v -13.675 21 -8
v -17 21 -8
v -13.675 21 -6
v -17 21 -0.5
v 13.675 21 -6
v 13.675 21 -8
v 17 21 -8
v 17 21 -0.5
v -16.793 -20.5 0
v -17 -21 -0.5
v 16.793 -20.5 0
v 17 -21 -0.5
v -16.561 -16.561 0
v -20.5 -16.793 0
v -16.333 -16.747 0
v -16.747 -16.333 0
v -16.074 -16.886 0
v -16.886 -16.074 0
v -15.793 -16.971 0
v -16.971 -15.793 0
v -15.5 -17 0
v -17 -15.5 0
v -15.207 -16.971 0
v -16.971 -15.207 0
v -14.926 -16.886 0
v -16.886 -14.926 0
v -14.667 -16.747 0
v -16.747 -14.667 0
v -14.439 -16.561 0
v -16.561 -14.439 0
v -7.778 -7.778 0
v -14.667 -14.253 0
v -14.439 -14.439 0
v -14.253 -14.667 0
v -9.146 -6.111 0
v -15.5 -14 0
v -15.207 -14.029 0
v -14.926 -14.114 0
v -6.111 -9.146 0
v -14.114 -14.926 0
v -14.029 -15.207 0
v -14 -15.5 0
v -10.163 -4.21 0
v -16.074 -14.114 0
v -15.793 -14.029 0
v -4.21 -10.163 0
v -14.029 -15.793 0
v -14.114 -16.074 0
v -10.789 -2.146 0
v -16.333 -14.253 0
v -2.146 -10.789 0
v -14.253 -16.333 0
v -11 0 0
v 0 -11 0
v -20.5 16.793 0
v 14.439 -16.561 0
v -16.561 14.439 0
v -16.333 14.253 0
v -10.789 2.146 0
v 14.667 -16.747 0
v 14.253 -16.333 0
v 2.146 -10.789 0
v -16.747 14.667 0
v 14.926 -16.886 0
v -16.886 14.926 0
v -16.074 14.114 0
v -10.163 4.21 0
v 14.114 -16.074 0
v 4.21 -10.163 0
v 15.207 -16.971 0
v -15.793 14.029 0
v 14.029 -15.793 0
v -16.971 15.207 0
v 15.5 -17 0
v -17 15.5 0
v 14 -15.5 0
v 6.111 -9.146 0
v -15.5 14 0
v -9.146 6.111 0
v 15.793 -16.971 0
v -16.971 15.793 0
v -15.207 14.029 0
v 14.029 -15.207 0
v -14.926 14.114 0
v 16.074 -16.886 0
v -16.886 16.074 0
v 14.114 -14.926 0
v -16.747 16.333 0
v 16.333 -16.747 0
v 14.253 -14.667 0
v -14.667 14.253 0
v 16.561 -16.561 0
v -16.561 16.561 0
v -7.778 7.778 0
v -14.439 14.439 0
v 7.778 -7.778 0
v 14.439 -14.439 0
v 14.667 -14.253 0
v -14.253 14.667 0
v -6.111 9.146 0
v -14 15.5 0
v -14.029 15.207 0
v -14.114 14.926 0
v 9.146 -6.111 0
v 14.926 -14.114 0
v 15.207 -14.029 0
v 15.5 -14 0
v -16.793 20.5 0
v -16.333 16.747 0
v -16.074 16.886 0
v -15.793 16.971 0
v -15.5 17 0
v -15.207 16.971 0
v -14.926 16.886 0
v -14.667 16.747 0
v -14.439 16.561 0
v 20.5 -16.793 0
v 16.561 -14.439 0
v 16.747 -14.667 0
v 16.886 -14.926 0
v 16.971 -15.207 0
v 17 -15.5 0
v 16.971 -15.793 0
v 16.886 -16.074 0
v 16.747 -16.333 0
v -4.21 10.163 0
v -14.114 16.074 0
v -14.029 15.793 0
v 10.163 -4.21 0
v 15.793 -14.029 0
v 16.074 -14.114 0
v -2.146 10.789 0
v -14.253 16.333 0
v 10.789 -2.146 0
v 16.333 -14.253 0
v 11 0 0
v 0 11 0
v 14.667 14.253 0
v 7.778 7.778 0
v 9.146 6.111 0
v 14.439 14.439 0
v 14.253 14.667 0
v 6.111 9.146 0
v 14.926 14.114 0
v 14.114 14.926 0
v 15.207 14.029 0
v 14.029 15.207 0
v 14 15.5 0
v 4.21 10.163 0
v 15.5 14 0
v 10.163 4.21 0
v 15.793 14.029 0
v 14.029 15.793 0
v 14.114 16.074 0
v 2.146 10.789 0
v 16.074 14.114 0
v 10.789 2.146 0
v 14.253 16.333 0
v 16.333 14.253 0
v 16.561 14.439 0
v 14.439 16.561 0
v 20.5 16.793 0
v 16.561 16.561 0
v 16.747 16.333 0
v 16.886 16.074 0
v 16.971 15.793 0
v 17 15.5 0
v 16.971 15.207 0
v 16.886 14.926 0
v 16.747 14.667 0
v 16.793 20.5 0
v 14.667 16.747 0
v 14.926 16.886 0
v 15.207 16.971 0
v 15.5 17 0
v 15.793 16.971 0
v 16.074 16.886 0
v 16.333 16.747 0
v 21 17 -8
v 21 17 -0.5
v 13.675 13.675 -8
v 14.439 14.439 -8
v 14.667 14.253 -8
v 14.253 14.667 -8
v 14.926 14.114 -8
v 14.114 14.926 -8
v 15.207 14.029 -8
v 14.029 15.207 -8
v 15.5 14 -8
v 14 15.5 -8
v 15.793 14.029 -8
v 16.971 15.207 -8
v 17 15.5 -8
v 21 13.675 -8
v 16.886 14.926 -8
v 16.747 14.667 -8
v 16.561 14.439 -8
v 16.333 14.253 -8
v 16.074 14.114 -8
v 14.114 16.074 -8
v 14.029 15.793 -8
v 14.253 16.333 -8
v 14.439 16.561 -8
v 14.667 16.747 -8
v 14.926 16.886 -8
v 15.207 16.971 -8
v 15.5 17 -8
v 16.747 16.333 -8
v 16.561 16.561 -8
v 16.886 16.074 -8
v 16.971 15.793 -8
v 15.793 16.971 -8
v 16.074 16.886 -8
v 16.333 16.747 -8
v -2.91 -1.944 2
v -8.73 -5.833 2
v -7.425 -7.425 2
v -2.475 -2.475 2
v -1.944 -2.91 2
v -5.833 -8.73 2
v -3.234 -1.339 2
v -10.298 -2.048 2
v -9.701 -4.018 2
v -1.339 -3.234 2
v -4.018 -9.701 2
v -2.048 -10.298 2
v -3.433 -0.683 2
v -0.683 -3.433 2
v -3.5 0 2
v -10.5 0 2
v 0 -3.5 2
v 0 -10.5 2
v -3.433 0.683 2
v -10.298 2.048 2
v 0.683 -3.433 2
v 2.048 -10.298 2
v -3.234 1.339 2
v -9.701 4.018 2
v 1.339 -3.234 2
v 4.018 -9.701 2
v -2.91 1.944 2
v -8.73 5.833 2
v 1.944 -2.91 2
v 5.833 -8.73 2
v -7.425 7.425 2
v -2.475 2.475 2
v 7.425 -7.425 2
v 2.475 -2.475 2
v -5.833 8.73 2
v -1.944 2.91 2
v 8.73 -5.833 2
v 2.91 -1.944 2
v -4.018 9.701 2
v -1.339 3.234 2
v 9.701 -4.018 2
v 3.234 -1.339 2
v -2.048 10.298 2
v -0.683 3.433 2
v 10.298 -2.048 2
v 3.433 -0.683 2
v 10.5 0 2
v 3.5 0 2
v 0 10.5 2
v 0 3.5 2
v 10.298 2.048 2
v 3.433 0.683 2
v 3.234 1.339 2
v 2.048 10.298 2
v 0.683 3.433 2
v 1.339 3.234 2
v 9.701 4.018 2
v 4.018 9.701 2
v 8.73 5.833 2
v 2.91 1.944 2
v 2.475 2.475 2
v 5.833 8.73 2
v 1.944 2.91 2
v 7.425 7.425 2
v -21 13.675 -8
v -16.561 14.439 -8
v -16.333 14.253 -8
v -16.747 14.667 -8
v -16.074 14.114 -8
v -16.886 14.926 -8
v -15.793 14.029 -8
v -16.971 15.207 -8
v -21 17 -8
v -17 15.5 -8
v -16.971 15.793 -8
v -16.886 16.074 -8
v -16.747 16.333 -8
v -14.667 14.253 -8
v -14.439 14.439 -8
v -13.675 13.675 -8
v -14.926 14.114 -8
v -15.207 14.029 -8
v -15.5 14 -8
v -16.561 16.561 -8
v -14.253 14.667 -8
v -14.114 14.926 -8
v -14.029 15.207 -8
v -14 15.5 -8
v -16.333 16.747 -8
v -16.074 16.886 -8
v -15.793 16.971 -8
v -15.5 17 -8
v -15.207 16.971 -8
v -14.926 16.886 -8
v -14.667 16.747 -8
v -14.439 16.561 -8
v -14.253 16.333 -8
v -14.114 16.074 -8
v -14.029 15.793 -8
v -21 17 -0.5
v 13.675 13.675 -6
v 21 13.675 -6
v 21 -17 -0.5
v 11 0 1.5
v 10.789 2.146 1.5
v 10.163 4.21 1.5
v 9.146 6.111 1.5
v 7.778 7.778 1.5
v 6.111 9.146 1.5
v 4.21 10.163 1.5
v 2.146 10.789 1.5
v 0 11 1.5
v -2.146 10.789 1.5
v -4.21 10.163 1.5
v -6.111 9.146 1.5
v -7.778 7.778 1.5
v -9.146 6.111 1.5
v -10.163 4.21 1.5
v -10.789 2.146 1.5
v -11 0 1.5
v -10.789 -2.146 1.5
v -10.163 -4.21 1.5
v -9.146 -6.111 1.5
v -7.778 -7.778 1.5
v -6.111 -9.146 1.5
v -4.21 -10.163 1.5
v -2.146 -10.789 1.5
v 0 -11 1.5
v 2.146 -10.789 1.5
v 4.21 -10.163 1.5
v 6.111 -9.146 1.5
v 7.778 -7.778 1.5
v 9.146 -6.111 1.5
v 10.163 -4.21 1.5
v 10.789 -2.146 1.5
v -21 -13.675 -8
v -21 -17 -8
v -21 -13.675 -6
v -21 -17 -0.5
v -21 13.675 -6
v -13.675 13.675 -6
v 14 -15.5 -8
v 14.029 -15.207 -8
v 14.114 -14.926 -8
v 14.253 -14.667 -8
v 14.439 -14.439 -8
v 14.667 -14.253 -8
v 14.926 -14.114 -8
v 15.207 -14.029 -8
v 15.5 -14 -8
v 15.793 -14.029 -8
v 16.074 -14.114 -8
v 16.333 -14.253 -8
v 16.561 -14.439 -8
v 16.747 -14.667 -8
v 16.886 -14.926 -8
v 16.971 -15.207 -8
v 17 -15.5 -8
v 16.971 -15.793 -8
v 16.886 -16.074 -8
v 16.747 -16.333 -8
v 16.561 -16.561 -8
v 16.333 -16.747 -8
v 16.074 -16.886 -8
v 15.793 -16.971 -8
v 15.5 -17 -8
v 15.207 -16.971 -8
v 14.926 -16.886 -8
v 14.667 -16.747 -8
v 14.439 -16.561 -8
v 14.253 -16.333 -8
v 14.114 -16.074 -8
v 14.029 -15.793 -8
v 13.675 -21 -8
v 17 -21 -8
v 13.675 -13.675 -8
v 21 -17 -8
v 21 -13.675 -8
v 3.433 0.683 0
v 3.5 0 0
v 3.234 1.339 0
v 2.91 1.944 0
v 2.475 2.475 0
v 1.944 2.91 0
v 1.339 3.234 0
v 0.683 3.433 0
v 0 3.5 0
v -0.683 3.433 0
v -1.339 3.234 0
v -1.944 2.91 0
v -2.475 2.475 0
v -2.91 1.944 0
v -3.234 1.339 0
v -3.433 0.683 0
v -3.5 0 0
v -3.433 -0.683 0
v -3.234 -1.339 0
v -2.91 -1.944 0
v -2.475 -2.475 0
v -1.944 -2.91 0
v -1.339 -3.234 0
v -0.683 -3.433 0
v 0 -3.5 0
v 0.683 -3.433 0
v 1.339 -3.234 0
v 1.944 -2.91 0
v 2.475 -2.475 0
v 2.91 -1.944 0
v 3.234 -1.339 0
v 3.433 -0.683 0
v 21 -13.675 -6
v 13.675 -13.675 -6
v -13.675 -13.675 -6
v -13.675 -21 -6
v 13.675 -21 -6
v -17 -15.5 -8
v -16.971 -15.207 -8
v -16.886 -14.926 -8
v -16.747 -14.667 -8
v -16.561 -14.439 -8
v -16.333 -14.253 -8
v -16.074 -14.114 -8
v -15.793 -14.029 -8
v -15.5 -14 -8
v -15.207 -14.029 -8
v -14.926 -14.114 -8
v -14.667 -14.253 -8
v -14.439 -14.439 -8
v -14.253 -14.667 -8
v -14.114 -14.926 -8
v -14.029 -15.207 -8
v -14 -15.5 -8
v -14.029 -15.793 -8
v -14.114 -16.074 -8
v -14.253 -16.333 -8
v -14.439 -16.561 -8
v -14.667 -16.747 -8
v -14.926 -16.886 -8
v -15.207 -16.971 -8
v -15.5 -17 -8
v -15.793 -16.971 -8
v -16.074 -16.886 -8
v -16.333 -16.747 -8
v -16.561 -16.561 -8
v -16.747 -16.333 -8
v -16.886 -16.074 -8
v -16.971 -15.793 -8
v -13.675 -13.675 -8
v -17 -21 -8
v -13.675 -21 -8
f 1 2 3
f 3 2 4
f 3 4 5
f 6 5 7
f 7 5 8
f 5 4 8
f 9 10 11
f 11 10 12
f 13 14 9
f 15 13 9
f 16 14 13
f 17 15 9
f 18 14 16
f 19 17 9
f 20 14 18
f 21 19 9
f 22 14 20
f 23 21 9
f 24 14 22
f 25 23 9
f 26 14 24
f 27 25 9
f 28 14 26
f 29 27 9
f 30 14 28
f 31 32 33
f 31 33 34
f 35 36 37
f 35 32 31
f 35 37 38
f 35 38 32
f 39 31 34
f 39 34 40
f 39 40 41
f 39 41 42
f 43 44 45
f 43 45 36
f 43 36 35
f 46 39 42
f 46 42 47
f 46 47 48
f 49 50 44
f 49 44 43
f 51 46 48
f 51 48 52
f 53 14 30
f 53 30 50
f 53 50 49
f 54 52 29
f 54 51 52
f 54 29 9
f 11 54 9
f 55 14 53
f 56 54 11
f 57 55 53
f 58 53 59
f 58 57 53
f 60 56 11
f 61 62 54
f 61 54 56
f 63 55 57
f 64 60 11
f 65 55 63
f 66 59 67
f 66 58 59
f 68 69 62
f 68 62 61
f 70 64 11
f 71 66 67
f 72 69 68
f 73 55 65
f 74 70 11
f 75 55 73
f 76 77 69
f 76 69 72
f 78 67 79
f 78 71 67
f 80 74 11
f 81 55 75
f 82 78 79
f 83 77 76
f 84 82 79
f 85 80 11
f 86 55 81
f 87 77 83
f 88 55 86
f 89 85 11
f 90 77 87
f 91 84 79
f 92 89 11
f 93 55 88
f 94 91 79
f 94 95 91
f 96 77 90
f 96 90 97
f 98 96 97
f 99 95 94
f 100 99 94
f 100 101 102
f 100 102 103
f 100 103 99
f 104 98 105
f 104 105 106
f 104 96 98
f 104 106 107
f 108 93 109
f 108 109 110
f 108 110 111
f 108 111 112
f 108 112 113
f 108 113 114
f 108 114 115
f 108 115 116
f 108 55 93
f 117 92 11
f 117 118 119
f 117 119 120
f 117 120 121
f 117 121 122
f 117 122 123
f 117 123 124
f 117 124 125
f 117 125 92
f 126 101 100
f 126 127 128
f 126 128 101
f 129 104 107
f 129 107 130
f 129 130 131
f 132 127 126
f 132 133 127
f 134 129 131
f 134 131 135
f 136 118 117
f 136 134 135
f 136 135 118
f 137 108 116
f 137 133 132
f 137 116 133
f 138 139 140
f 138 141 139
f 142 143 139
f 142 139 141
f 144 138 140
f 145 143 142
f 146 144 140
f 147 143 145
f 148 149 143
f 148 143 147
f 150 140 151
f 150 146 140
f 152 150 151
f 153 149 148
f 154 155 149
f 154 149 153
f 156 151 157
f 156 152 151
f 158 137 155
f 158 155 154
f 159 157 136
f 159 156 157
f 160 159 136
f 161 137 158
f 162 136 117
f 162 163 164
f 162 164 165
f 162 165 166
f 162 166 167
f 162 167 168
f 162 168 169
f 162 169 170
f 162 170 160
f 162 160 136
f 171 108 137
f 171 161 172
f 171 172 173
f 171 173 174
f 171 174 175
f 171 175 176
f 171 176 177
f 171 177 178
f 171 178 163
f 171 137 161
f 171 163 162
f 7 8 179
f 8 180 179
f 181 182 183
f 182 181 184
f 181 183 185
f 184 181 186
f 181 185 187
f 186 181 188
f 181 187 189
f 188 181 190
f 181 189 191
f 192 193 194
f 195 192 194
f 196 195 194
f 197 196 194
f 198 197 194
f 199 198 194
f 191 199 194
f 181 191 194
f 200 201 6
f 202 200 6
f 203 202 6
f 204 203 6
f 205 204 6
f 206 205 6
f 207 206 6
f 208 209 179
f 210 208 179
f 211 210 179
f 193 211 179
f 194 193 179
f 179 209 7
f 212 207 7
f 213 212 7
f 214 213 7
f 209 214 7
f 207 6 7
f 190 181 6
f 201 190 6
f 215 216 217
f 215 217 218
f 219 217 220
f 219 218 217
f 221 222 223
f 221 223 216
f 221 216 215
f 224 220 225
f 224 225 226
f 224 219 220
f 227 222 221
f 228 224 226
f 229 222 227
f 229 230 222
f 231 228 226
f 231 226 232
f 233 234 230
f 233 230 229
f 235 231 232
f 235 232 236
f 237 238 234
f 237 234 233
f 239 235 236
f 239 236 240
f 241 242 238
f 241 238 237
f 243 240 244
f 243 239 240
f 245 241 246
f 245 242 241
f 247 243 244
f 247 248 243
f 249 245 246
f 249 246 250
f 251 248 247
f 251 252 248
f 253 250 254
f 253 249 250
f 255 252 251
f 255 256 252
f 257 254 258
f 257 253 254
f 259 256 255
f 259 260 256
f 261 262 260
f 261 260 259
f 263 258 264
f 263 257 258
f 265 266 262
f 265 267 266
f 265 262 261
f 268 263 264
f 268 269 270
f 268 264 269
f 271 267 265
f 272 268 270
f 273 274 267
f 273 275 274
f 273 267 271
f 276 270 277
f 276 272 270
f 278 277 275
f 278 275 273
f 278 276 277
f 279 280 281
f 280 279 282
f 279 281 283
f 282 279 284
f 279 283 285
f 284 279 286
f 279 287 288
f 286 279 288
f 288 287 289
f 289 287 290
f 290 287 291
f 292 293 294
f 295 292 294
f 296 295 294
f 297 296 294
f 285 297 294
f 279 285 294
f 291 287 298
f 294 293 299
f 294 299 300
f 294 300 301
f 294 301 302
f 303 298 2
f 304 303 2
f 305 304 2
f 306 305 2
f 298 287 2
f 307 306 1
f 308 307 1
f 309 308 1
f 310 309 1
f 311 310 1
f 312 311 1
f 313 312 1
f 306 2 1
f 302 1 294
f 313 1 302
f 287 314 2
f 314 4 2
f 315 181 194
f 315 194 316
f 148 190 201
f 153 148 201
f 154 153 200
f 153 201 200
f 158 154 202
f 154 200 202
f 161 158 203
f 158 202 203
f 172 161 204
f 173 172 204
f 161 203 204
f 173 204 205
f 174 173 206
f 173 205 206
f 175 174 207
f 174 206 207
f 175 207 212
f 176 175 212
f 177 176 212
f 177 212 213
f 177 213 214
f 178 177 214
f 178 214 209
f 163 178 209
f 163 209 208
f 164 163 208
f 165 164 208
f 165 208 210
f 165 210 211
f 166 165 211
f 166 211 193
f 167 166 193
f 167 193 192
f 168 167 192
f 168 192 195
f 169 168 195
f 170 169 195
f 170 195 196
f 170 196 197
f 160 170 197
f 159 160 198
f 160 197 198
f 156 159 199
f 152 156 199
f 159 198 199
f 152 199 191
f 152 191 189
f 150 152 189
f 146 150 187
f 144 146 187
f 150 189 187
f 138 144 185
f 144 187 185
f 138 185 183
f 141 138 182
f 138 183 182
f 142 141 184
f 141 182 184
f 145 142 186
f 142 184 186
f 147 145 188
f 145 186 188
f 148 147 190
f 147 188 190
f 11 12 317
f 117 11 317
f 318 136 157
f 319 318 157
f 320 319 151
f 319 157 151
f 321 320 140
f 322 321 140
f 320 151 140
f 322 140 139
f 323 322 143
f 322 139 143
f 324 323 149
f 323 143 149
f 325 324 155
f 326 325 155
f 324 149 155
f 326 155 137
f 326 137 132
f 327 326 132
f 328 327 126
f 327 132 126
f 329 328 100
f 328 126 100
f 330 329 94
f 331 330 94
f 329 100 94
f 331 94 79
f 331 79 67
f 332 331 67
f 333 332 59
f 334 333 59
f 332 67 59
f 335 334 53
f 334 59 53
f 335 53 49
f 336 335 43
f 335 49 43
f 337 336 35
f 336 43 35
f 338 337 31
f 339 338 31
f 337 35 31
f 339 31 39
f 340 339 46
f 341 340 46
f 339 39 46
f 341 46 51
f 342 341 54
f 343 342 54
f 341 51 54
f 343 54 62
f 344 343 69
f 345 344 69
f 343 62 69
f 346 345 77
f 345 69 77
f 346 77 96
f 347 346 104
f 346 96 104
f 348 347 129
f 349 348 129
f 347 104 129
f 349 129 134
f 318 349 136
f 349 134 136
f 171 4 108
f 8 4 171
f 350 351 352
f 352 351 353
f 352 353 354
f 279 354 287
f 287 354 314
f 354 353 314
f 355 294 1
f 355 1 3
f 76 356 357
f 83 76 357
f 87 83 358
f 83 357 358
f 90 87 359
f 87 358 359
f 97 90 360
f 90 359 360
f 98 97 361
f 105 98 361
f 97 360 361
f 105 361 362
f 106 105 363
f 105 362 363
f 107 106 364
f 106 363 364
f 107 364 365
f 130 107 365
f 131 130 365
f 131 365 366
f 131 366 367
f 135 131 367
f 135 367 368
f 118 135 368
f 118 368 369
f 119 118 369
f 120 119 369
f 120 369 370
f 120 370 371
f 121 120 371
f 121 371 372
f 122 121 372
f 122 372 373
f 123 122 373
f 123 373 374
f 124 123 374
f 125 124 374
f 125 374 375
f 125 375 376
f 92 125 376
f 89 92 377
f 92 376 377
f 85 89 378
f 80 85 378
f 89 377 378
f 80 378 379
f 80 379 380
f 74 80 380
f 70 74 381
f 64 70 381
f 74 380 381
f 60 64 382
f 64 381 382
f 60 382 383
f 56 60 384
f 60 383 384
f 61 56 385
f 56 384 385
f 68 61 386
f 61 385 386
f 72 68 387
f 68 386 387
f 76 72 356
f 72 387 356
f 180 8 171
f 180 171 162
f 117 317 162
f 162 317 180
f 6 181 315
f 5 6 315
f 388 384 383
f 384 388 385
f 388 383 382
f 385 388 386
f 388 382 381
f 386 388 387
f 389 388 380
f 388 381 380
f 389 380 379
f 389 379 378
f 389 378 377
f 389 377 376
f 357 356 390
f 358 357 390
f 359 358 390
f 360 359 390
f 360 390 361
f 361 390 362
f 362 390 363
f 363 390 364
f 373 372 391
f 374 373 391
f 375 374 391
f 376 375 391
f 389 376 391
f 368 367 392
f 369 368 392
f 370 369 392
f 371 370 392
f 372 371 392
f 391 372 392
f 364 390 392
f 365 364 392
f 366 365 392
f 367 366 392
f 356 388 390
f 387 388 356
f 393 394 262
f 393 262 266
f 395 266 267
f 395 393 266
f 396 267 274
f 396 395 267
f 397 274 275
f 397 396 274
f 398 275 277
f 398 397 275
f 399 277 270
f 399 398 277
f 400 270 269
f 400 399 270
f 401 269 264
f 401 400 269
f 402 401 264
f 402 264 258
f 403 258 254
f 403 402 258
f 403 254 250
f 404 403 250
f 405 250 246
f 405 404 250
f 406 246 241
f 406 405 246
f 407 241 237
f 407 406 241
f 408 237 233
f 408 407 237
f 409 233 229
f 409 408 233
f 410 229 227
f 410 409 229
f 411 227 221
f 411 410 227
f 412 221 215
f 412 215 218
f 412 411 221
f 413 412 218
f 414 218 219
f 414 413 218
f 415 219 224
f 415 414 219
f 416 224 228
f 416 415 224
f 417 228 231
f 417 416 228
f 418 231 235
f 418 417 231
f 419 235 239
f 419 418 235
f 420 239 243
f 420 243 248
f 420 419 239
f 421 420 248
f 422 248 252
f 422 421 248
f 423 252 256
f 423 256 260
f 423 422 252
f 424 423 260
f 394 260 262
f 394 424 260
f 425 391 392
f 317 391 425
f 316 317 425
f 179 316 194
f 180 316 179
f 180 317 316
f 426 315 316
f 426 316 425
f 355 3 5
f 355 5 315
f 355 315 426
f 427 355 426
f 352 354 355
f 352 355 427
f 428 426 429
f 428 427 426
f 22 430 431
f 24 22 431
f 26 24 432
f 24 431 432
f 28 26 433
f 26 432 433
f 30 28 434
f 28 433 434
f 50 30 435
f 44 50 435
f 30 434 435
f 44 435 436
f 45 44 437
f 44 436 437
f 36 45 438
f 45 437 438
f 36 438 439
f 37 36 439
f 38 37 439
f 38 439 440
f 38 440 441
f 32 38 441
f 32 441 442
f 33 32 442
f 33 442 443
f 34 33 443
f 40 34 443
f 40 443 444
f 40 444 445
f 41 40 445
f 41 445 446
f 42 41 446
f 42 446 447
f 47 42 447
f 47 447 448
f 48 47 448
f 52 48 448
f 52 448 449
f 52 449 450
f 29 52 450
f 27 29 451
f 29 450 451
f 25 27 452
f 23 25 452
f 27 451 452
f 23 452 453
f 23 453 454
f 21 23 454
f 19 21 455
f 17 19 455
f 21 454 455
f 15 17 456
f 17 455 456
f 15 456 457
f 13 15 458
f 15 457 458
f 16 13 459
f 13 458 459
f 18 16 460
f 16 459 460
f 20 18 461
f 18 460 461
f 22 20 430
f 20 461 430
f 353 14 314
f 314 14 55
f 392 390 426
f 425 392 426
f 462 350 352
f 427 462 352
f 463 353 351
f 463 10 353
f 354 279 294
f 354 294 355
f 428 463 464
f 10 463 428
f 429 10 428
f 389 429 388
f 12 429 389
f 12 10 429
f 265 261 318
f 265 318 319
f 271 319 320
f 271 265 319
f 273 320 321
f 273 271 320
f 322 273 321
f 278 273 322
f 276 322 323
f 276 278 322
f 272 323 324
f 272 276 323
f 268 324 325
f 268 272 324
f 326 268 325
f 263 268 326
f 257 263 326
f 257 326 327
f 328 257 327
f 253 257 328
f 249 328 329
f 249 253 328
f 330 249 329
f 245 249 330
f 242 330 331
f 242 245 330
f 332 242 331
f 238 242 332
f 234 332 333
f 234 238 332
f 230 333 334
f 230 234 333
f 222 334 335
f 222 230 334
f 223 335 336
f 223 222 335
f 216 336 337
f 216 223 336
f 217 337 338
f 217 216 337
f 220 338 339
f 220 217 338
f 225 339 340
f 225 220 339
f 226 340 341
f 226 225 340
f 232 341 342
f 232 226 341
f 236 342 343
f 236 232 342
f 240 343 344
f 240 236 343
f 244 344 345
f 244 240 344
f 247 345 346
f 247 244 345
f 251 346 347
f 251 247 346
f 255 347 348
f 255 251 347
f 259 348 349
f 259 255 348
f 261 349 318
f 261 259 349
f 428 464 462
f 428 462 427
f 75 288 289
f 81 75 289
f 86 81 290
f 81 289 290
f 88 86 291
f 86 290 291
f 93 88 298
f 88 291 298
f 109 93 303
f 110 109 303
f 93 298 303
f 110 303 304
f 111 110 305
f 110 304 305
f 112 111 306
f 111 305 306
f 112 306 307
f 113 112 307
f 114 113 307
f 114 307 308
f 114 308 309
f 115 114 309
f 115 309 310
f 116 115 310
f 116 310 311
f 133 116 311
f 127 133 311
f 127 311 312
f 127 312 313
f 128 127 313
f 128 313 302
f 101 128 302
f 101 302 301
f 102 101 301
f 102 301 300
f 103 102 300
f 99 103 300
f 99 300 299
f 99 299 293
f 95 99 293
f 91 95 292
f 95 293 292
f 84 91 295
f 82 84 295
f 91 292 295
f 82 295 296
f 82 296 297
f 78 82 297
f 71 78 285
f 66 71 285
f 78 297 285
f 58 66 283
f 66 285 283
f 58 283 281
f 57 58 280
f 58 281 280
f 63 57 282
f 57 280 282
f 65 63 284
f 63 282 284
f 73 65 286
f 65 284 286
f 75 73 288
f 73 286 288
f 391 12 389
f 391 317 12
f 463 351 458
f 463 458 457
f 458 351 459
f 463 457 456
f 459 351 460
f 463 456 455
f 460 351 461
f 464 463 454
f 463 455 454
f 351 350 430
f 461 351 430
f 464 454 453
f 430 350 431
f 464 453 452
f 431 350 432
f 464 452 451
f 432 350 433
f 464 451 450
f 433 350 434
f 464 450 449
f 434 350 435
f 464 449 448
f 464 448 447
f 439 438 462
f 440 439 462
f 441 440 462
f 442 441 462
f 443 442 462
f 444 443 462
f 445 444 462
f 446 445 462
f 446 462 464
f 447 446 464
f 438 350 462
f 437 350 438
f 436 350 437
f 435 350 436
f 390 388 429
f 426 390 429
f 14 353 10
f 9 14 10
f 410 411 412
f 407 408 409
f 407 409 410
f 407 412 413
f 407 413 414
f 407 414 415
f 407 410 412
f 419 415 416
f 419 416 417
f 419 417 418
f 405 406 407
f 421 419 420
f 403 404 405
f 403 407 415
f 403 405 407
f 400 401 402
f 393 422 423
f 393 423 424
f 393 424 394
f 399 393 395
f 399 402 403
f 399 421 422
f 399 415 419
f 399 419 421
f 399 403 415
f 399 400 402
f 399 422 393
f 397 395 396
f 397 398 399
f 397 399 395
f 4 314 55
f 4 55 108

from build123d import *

# Parameters (mm, degrees)
F0_W     = 42
F0_H     = 42
F0_R     = 11
F0_R_2   = 3.5
F1_DEPTH = 8
F2_DEPTH = 2
F3_D     = 3
F4_W     = 27.35
F4_H     = 2
F5_DEPTH = 42
F6_W     = 27.35
F6_H     = 2
F7_DEPTH = 42
F8_SIZE  = 4
F9_SIZE  = 0.5


with BuildPart() as f1:
    # F0 (on Top) → F1 (new body)
    with BuildSketch(Plane.XY):
        Rectangle(F0_W, F0_H)
        Circle(F0_R, mode=Mode.SUBTRACT)
        Circle(F0_R)
        Circle(F0_R_2, mode=Mode.SUBTRACT)
        Circle(F0_R_2)
    extrude(amount=-F1_DEPTH)

    # F0 (on Top) → F2 (join)
    with BuildSketch(Plane.XY):
        Circle(F0_R)
        Circle(F0_R_2, mode=Mode.SUBTRACT)
    extrude(amount=F2_DEPTH)

    # F3 (through all)
    with Locations(Plane.XY):
        with Locations((15.5, 15.5), (15.5, -15.5), (-15.5, -15.5), (-15.5, 15.5)):
            Hole(F3_D / 2)

    # F4 (on face) → F5 (cut, through all)
    with BuildSketch(Plane.XZ.offset(21)):
        with Locations((0, -7)):
            Rectangle(F4_W, F4_H)
    extrude(amount=-F5_DEPTH, mode=Mode.SUBTRACT)

    # F6 (on face) → F7 (cut, through all)
    with BuildSketch(Plane(origin=(-21, 0, 0), x_dir=(0, -1, 0), z_dir=(-1, 0, 0))):
        with Locations((0, -7)):
            Rectangle(F6_W, F6_H)
    extrude(amount=-F7_DEPTH, mode=Mode.SUBTRACT)

    # F8
    f8_edges = [f1.edges().sort_by_distance(p)[0] for p in [
        (-21, -21, -4),
        (-21, 21, -4),
        (21, -21, -4),
        (21, 21, -4),
    ]]
    chamfer(f8_edges, length=F8_SIZE)

    # F9
    f9_edges = [f1.edges().sort_by_distance(p)[0] for p in [
        (-11, 0, 2),
        (-21, 0, 0),
        (-19, -19, 0),
        (0, -21, 0),
        (19, -19, 0),
        (21, 0, 0),
        (19, 19, 0),
        (0, 21, 0),
        (-19, 19, 0),
    ]]
    chamfer(f9_edges, length=F9_SIZE)


solid = f1.part
